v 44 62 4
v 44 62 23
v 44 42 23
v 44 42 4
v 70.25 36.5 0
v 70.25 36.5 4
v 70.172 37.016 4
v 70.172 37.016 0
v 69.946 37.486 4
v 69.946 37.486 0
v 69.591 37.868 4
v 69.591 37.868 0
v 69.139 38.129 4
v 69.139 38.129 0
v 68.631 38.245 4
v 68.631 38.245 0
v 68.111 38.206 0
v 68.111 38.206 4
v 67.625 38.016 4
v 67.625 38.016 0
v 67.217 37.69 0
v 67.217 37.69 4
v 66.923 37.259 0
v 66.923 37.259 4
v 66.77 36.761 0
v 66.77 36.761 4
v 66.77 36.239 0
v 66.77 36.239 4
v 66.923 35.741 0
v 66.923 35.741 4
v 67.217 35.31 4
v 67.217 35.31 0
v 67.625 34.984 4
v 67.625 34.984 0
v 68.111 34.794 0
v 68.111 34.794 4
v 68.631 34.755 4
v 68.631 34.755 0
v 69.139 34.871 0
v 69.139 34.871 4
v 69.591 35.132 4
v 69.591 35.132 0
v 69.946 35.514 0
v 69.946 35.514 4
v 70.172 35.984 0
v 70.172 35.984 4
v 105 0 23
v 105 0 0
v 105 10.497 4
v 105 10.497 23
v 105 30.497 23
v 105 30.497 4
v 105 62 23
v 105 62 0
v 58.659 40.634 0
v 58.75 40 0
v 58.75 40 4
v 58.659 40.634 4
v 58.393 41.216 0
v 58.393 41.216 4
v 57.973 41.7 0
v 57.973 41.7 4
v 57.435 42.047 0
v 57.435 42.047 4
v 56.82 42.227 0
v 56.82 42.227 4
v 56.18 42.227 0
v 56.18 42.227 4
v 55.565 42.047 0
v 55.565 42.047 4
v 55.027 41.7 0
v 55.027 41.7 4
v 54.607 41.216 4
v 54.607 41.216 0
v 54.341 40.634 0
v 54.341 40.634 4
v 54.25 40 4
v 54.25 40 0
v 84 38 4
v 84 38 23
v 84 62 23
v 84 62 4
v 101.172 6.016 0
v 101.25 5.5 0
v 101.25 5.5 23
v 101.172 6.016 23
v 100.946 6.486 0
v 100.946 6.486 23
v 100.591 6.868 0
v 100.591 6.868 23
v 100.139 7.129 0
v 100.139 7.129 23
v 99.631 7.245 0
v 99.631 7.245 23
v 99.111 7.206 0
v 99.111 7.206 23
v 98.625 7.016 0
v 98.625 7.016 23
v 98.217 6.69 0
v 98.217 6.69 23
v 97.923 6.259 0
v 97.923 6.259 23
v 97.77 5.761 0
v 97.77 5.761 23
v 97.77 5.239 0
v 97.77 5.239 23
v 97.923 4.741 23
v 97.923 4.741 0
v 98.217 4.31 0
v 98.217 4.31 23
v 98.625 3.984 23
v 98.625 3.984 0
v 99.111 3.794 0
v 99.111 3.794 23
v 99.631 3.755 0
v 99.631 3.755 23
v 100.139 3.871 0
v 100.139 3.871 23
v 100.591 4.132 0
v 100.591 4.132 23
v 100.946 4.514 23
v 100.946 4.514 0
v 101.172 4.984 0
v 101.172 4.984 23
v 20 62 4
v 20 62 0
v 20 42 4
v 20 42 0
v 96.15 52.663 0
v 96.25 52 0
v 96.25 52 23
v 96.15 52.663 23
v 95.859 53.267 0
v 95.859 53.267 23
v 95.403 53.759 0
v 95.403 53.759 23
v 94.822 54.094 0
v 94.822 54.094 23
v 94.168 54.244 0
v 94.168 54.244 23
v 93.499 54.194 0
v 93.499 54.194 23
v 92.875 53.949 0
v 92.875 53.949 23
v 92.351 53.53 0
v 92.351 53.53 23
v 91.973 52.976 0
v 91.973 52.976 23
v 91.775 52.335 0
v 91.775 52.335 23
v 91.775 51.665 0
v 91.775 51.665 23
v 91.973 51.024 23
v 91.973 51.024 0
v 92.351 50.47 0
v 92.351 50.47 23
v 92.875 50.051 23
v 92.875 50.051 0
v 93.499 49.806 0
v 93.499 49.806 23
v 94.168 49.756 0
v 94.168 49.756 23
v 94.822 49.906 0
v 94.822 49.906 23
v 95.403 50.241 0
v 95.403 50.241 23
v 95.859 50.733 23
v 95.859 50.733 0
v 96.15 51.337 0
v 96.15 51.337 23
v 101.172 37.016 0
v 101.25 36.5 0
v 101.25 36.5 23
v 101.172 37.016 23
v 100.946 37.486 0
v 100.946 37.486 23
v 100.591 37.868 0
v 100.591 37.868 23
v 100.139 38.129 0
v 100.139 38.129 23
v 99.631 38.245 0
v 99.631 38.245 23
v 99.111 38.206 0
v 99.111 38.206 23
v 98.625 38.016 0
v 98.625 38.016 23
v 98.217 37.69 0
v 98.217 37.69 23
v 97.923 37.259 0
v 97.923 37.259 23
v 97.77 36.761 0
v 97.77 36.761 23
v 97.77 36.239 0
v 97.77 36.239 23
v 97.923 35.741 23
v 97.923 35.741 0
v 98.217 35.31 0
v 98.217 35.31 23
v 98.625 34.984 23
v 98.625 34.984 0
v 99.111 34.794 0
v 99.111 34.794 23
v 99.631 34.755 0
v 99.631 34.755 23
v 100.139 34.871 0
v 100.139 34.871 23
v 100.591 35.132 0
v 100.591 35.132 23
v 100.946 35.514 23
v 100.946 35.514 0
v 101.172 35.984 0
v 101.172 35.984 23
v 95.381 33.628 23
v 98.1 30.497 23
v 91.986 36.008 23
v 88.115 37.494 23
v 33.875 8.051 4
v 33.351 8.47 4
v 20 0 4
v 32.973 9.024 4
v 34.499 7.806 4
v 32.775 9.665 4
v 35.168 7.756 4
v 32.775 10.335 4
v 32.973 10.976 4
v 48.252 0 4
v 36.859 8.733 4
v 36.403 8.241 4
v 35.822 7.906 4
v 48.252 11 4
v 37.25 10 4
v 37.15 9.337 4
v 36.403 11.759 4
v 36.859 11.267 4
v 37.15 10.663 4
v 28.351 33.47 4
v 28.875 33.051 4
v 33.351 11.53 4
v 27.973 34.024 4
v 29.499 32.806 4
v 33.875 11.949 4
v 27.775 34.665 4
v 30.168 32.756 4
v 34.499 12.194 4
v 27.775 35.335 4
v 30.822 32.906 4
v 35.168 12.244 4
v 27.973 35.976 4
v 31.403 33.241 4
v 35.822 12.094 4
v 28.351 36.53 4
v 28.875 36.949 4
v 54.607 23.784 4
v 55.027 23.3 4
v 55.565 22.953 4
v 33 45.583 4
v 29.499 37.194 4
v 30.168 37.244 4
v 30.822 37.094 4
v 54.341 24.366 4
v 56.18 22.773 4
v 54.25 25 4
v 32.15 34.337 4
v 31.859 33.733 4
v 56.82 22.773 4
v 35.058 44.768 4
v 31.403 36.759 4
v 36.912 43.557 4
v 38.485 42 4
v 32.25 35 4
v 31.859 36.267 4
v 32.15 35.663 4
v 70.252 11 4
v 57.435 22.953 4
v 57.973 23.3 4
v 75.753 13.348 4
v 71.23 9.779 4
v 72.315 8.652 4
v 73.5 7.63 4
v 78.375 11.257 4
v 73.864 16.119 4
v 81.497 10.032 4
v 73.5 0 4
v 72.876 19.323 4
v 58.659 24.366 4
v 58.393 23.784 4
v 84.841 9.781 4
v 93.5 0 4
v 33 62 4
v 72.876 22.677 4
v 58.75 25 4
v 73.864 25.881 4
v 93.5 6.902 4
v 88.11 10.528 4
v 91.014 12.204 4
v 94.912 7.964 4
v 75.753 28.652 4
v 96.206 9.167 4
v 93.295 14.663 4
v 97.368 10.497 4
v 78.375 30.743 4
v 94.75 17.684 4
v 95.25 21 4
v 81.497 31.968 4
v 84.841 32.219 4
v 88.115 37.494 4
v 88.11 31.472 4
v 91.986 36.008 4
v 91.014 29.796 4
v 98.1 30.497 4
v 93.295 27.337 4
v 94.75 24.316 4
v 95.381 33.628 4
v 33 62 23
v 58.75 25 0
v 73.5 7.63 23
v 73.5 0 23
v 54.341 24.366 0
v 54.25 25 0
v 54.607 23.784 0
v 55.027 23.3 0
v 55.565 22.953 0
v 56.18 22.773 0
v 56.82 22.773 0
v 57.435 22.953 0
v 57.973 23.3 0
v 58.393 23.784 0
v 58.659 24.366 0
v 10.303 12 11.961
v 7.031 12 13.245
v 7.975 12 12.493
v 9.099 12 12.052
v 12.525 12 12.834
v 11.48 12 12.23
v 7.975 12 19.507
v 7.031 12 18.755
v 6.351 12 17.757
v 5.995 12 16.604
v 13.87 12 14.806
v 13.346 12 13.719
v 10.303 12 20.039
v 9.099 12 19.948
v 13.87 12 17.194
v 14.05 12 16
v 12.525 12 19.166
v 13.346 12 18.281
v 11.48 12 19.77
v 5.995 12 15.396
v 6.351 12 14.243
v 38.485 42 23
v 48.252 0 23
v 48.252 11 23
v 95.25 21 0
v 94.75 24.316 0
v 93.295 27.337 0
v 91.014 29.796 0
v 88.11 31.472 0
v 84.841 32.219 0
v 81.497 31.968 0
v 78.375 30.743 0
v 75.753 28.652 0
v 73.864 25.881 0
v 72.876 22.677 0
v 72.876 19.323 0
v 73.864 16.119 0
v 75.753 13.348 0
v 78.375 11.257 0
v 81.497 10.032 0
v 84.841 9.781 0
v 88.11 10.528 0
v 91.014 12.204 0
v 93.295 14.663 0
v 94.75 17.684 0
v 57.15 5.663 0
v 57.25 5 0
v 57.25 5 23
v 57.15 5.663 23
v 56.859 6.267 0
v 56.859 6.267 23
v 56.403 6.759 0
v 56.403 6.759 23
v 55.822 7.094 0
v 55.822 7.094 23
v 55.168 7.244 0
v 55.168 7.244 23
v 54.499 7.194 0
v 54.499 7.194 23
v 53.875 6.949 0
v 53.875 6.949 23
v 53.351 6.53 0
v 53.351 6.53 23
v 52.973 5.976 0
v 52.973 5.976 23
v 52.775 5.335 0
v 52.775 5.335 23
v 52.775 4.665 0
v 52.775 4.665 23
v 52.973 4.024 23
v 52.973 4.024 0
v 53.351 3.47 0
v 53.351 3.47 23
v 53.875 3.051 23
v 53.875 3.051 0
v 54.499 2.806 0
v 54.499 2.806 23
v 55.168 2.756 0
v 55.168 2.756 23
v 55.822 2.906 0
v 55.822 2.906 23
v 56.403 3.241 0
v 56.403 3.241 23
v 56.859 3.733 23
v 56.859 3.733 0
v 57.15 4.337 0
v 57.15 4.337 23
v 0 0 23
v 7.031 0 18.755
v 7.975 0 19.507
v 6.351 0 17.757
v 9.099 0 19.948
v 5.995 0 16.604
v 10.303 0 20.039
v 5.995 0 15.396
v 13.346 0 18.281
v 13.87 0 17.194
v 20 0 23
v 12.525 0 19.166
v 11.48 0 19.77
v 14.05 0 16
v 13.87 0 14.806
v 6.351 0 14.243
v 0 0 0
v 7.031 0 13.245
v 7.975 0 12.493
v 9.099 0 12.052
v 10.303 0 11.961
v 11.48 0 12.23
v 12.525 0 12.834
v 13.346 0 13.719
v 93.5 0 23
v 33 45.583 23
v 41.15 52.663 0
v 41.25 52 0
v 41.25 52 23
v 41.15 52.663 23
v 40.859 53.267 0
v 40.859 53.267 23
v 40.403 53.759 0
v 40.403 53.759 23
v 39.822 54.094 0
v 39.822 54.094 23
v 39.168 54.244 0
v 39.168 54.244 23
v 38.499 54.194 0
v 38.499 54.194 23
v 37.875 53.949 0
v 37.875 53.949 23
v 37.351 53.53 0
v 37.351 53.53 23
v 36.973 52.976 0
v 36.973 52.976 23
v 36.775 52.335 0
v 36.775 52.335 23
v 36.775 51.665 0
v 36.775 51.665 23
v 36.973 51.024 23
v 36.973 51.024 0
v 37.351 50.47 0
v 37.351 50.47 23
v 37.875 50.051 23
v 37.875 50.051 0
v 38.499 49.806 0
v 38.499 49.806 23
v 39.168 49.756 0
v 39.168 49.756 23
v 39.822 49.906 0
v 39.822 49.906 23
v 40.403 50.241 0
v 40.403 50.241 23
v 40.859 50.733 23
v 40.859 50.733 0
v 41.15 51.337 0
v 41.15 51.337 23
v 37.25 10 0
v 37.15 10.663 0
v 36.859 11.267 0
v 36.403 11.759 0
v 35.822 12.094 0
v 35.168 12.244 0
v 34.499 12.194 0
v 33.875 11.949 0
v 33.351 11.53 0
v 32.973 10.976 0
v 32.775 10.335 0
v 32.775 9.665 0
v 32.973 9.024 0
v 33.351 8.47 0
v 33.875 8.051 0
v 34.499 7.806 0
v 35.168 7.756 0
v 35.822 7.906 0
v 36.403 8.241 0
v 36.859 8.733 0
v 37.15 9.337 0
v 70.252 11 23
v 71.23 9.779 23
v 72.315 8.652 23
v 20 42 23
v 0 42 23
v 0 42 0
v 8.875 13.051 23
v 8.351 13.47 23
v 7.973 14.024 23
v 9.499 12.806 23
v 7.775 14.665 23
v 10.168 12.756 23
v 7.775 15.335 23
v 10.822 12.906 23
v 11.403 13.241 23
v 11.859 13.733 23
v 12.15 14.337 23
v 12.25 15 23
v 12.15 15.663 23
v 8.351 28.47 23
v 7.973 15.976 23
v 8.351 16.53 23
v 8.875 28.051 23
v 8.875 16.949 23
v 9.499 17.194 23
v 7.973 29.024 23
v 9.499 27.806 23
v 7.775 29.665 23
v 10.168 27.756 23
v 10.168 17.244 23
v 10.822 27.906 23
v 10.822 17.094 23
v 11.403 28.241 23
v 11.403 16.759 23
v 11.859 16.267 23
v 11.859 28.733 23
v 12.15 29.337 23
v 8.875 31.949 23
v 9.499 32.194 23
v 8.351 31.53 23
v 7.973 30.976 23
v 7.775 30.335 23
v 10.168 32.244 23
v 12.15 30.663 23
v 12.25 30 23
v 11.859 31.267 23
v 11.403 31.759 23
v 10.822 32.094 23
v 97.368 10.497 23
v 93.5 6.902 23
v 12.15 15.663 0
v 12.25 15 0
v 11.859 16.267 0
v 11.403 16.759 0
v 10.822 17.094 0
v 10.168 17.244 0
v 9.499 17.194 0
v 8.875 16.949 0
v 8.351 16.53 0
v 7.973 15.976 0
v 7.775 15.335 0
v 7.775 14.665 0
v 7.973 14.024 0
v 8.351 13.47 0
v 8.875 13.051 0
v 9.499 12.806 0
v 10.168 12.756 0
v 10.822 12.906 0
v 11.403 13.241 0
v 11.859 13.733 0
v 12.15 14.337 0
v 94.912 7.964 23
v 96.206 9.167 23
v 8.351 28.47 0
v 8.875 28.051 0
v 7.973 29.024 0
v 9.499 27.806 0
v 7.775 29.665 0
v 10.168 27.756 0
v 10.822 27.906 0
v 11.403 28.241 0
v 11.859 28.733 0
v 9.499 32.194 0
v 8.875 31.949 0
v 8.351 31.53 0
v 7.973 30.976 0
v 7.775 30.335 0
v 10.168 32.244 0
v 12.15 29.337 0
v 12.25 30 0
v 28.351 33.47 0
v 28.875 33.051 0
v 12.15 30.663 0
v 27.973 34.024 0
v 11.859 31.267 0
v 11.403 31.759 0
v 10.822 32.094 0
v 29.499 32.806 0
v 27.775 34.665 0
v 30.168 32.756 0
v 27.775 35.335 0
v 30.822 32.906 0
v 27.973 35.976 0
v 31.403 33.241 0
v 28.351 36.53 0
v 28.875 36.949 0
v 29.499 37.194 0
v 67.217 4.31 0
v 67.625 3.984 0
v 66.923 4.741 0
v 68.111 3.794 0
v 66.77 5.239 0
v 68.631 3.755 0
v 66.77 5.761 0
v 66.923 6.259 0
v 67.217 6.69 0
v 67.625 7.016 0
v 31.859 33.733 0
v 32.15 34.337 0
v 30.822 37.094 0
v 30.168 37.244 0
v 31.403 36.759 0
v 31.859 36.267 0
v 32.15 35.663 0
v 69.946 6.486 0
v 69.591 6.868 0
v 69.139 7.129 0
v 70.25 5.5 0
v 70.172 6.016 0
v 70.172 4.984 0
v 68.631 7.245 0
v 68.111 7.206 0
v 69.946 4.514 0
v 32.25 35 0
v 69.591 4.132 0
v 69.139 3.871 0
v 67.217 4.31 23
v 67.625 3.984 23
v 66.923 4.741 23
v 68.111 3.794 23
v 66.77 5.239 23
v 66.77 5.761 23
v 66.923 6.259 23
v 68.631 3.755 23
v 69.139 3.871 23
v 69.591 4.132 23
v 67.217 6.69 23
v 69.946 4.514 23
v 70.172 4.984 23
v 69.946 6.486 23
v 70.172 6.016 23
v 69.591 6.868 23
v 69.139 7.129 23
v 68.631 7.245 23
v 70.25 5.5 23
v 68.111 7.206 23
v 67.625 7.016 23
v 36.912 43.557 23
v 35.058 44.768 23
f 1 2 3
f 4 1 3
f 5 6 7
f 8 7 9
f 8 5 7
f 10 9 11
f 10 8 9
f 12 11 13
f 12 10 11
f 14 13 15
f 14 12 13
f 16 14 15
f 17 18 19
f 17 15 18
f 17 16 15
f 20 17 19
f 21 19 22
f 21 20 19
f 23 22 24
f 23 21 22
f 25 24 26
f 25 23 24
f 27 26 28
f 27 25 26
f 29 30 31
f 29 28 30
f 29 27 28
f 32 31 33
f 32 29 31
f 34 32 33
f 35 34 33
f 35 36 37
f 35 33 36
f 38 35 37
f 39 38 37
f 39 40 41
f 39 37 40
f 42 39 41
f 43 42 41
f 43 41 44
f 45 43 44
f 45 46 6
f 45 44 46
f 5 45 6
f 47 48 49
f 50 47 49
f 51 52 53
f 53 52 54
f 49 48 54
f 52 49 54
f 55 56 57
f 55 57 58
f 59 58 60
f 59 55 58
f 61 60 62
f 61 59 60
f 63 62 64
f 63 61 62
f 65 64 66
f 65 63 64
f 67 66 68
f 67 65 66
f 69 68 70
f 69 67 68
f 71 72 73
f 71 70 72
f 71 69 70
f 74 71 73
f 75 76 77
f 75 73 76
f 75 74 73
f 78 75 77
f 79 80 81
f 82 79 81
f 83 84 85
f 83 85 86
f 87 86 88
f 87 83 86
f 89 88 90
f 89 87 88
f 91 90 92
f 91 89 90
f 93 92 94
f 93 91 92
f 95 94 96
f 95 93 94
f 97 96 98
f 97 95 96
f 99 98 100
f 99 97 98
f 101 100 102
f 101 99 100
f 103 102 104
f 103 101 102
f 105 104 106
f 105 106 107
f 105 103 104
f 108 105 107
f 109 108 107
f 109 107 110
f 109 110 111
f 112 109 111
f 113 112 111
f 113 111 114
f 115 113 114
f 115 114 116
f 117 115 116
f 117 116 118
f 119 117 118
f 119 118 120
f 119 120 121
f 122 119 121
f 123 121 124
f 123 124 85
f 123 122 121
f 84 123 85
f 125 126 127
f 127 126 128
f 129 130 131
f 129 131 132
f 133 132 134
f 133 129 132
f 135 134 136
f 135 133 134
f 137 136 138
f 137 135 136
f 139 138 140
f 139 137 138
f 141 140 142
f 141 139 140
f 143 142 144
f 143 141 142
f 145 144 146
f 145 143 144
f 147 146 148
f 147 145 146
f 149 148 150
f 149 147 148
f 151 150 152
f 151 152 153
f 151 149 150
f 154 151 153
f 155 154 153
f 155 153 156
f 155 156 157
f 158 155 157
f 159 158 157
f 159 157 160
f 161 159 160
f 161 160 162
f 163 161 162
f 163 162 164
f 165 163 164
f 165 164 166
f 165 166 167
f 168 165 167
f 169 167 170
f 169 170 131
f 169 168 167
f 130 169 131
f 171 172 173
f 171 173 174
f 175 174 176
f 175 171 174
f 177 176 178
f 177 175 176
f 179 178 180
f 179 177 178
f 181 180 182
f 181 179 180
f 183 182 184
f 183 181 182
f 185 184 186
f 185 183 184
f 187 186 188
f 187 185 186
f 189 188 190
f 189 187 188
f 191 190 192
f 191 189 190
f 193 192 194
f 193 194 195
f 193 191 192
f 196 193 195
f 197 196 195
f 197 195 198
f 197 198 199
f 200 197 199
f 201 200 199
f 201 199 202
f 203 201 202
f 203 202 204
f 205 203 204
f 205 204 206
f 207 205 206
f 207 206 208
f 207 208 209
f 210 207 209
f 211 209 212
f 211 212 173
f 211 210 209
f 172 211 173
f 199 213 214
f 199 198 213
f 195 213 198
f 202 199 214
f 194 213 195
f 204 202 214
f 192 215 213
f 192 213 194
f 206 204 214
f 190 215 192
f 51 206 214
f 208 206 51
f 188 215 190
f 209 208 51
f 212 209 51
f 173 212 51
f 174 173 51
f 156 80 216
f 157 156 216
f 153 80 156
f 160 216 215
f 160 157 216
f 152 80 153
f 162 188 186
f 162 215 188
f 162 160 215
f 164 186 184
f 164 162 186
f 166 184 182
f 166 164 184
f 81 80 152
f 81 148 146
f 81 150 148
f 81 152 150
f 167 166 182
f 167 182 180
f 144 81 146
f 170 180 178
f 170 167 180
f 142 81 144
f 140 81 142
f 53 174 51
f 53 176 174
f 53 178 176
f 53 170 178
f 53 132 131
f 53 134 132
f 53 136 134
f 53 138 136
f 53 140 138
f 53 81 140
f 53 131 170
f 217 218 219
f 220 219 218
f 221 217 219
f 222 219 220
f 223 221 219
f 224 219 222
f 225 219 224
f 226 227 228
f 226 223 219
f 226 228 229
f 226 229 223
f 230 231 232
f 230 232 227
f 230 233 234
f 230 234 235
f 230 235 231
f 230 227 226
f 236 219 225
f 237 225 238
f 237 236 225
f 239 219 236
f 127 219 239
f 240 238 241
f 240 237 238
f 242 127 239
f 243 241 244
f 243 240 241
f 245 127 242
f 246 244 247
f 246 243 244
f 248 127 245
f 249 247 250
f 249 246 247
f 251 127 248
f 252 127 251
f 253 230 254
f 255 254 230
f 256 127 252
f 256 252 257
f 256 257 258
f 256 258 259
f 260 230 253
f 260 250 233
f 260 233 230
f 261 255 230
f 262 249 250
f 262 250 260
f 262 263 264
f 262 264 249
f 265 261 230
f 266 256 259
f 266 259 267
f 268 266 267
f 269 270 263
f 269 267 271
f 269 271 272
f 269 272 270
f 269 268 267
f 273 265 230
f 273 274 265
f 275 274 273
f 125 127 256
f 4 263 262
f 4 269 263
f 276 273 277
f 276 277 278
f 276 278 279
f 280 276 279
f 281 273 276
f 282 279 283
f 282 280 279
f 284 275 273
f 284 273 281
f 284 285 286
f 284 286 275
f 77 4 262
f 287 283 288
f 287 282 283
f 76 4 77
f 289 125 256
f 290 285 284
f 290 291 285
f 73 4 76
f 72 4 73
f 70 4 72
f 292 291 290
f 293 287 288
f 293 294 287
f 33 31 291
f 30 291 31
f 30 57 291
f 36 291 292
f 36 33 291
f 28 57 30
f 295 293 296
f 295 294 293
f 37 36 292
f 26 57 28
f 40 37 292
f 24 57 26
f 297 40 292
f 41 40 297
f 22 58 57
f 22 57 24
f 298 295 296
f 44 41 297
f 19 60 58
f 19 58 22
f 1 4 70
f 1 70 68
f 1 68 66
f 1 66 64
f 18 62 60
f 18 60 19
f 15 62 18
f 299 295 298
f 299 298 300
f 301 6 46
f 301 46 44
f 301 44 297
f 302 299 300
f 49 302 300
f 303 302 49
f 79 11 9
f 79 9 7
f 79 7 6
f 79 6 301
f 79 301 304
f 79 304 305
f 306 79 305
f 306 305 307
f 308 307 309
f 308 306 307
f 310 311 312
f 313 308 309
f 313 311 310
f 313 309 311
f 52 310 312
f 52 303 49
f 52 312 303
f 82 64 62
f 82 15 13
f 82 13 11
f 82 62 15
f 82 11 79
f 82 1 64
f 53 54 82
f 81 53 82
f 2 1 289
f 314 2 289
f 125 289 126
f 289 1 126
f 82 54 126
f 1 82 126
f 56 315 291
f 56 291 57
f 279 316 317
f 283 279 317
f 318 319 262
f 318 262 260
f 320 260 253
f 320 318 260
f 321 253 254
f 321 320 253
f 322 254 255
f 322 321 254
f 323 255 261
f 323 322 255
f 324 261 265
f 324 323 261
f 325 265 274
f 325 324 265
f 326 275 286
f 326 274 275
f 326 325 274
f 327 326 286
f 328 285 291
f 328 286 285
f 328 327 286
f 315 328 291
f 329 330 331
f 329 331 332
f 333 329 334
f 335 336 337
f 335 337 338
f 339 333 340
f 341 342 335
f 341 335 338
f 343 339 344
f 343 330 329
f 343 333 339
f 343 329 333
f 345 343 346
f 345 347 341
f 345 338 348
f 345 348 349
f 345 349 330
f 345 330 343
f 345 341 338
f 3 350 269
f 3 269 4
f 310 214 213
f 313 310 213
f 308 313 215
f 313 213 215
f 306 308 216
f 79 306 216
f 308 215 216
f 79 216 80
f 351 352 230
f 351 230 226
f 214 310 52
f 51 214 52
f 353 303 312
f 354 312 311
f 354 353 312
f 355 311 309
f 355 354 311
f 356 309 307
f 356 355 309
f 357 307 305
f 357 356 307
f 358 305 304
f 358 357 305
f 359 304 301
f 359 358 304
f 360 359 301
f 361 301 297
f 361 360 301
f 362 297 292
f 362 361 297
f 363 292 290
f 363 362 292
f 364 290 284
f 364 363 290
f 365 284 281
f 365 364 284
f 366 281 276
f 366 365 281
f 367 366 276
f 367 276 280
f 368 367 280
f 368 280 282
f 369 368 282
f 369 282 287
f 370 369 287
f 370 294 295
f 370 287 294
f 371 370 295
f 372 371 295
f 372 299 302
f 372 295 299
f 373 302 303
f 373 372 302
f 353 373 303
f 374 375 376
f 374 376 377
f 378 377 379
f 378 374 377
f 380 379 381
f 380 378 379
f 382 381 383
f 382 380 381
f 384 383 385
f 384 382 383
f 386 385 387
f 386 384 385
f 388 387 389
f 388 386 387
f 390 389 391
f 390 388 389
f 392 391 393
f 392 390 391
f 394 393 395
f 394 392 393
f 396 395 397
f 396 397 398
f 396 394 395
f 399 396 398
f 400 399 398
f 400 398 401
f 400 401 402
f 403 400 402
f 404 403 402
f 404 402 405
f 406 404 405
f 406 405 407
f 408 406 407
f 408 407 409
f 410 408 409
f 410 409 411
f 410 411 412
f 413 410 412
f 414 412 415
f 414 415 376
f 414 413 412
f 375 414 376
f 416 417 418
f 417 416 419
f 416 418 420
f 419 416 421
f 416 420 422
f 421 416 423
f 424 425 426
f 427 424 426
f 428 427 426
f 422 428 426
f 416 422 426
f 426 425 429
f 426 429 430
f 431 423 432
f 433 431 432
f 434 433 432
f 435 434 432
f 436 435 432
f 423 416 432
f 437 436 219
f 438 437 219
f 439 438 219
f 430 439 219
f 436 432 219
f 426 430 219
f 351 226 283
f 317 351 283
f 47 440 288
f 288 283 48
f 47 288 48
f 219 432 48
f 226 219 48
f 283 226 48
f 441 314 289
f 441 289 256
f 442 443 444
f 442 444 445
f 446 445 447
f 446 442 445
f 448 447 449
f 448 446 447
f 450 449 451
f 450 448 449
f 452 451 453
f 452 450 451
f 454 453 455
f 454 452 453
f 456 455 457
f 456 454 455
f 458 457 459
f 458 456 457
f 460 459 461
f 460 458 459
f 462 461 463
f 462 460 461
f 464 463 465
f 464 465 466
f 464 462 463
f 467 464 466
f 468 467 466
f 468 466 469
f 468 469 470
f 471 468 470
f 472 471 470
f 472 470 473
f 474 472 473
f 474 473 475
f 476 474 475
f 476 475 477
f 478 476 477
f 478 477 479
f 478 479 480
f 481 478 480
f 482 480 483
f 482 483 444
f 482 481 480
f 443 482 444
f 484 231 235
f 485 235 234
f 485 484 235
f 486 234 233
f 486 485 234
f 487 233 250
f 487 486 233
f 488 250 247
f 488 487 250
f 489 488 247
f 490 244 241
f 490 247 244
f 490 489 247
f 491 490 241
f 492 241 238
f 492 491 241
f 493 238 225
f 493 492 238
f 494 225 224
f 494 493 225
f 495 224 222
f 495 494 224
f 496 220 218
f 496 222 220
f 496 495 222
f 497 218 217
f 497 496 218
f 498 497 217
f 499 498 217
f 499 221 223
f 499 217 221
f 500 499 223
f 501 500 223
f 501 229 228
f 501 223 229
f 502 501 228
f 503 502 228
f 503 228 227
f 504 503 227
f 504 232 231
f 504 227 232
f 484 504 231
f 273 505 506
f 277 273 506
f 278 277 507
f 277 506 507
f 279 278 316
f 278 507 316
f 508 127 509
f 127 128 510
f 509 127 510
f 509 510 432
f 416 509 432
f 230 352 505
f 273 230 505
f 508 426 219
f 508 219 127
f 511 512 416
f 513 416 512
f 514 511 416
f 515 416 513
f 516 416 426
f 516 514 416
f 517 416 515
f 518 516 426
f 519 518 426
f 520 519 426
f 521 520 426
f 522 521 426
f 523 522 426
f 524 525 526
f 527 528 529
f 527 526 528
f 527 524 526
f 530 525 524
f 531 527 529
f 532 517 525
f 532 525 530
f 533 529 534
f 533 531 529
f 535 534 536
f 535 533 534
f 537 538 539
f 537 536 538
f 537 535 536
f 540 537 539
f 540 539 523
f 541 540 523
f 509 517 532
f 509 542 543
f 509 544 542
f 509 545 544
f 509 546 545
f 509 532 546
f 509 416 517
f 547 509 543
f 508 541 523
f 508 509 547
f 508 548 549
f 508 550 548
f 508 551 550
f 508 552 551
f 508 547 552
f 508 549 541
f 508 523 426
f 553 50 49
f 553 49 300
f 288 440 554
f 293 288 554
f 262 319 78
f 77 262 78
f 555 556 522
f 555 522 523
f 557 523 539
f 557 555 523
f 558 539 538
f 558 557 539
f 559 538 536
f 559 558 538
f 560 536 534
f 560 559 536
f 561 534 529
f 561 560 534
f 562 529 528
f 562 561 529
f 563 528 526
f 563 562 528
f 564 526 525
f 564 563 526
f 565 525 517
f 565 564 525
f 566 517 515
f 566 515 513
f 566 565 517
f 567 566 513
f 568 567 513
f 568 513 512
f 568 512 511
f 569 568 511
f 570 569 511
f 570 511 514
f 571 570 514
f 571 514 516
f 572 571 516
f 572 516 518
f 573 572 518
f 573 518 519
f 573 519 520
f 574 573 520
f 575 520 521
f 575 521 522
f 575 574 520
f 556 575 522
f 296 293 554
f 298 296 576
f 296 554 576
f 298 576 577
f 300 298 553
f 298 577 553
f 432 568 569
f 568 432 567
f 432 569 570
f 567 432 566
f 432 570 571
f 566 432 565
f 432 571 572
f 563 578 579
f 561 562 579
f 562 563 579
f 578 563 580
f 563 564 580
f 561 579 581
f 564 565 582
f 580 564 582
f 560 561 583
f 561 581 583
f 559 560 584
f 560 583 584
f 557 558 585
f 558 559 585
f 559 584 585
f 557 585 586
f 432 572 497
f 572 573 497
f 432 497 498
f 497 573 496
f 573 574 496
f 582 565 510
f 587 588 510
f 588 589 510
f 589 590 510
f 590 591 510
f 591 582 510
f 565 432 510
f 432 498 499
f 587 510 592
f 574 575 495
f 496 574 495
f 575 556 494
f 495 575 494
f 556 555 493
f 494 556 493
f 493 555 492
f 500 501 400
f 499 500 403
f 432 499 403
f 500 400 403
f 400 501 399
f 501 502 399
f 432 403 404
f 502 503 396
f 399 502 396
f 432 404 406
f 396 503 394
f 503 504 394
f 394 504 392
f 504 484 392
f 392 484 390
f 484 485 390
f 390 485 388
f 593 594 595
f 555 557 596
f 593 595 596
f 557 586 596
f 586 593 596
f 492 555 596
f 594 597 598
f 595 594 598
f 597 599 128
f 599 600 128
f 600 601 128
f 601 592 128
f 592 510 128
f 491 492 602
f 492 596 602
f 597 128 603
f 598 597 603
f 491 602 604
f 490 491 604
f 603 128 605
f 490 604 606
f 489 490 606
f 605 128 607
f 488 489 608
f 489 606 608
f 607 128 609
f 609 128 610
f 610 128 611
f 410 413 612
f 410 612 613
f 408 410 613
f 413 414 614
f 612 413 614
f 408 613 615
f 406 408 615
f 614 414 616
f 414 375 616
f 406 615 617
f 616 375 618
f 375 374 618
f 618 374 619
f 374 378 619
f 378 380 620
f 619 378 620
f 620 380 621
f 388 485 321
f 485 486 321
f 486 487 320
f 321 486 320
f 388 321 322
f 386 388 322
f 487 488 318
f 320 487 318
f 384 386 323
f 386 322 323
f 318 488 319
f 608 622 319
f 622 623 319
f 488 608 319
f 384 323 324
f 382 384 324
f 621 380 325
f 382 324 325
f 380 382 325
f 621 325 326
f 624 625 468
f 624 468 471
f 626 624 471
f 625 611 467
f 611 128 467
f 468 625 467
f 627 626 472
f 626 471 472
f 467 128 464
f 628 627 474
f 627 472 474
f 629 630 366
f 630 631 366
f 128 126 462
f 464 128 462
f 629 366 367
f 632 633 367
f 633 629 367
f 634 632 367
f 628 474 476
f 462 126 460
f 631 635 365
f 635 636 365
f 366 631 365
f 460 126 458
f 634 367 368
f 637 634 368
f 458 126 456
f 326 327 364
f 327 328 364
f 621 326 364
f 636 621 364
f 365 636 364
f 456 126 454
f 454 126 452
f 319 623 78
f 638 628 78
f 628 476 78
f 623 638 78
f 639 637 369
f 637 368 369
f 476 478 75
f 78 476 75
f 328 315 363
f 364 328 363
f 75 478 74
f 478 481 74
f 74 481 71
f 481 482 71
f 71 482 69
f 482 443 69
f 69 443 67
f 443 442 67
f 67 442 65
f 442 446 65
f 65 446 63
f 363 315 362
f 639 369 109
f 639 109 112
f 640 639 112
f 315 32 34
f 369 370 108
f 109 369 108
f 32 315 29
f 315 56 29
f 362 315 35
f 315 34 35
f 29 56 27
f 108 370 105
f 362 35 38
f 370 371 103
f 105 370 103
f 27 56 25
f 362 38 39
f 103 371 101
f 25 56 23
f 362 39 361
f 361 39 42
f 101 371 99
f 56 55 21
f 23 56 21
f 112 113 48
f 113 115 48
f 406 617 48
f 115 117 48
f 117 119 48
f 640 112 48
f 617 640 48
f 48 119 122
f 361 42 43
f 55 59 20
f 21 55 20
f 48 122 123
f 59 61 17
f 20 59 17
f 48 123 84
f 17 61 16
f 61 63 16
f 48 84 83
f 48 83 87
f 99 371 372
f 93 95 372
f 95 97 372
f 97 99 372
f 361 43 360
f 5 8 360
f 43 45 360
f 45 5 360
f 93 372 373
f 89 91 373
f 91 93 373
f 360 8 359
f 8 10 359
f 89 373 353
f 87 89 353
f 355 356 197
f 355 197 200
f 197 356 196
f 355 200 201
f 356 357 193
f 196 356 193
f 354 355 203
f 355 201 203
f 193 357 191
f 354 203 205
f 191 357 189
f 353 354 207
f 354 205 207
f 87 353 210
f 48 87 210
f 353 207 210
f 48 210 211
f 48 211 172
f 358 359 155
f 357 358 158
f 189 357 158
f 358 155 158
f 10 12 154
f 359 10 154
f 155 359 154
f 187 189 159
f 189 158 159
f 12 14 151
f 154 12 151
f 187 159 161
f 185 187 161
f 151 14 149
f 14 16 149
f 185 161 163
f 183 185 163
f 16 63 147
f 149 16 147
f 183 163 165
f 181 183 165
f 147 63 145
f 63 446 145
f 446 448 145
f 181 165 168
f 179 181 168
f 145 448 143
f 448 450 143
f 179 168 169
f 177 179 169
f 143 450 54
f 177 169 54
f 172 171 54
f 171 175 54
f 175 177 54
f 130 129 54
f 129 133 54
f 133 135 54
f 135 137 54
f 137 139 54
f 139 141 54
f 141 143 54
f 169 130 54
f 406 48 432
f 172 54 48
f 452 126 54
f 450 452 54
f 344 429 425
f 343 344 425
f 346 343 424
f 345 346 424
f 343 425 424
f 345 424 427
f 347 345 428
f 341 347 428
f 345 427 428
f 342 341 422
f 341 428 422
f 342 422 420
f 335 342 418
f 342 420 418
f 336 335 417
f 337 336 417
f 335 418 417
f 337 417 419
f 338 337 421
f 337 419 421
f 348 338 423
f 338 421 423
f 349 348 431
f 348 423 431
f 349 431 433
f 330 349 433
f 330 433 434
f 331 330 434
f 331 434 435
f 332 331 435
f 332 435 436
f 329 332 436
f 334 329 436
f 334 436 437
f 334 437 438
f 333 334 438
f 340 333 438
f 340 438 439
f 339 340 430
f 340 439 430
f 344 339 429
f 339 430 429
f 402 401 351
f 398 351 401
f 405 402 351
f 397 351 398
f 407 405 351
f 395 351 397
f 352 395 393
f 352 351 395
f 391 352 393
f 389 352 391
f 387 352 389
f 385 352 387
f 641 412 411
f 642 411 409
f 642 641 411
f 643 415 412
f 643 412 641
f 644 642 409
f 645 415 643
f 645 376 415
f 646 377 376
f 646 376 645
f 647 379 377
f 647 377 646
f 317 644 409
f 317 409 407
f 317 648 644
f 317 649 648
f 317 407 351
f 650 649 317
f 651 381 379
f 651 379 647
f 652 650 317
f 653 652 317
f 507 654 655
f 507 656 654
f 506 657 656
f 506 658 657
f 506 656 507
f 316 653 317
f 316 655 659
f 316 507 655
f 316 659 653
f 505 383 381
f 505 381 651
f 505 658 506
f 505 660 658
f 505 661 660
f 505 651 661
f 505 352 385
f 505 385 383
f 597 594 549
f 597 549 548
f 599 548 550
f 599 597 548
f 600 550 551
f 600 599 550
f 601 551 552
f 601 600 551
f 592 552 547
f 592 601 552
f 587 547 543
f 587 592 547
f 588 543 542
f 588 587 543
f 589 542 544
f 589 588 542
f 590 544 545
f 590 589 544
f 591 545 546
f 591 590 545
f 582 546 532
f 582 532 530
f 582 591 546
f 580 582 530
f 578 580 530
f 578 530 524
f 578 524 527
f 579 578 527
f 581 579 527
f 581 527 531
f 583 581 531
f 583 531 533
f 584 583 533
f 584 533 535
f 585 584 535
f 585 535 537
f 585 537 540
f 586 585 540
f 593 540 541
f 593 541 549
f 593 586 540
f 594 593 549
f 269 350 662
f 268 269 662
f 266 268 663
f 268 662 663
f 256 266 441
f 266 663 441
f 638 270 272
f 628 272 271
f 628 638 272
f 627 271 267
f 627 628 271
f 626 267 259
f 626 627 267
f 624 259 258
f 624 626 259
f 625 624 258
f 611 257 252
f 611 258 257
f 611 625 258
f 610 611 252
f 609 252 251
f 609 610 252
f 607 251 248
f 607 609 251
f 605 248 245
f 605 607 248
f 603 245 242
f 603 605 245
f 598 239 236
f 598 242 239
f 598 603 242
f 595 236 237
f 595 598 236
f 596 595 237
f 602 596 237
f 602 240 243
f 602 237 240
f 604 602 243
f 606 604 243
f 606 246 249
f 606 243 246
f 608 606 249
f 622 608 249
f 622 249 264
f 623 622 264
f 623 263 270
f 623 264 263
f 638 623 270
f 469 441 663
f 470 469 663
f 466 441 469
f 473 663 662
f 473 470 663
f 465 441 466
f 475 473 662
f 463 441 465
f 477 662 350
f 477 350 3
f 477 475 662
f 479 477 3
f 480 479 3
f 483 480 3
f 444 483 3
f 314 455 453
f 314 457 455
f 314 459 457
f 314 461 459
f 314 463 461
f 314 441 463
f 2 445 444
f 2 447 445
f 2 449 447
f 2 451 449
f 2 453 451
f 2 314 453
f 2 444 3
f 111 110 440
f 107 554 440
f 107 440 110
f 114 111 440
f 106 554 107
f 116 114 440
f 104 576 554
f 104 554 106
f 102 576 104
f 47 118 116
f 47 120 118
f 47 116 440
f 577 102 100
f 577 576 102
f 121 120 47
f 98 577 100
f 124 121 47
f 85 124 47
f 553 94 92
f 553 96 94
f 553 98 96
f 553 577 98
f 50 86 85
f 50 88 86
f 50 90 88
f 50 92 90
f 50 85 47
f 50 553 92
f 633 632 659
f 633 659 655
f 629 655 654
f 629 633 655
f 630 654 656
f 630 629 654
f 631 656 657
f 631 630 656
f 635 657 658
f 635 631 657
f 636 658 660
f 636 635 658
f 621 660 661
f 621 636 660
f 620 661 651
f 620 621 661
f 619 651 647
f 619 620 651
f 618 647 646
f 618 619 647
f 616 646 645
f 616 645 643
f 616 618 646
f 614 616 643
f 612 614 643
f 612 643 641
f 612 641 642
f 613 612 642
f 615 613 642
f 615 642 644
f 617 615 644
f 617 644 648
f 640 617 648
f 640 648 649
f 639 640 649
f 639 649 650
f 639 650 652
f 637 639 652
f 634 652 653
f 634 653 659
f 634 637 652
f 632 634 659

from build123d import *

# Parameters (mm, degrees)
SKETCH_R        = 2.25
SKETCH_R_2      = 11.25
SKETCH_R_3      = 1.75
PAD_DEPTH       = 23
POCKET_DEPTH    = 19
SKETCH003_R     = 4.05
POCKET002_DEPTH = 12


with BuildPart() as part:
    # Sketch → Pad (new body)
    with BuildSketch(Plane.XY):
        Polygon((0, 0), (105, 0), (105, 62), (20, 62), (20, 42), (0, 42), align=None)
        with Locations((35, 10)):
            Circle(SKETCH_R, mode=Mode.SUBTRACT)
        with Locations((30, 35)):
            Circle(SKETCH_R, mode=Mode.SUBTRACT)
        with Locations((84, 21)):
            Circle(SKETCH_R_2, mode=Mode.SUBTRACT)
        with Locations((68.5, 36.5)):
            Circle(SKETCH_R_3, mode=Mode.SUBTRACT)
        with Locations((99.5, 36.5)):
            Circle(SKETCH_R_3, mode=Mode.SUBTRACT)
        with Locations((68.5, 5.5)):
            Circle(SKETCH_R_3, mode=Mode.SUBTRACT)
        with Locations((99.5, 5.5)):
            Circle(SKETCH_R_3, mode=Mode.SUBTRACT)
        with Locations((10, 30)):
            Circle(SKETCH_R, mode=Mode.SUBTRACT)
        with Locations((10, 15)):
            Circle(SKETCH_R, mode=Mode.SUBTRACT)
        with Locations((39, 52)):
            Circle(SKETCH_R, mode=Mode.SUBTRACT)
        with Locations((94, 52)):
            Circle(SKETCH_R, mode=Mode.SUBTRACT)
        with Locations((55, 5)):
            Circle(SKETCH_R, mode=Mode.SUBTRACT)
        with BuildLine():
            Line((58.75, 25), (58.75, 40))
            ThreePointArc((58.75, 40), (56.5, 42.25), (54.25, 40))
            Line((54.25, 25), (54.25, 40))
            ThreePointArc((54.25, 25), (56.5, 22.75), (58.75, 25))
        make_face(mode=Mode.SUBTRACT)
    extrude(amount=PAD_DEPTH)

    # Sketch001 → Pocket (cut)
    with BuildSketch(Plane.XY.offset(23)):
        with BuildLine():
            ThreePointArc((38.485281, 42), (36.015595, 44.209377), (32.999996, 45.583006))
            Line((32.999996, 67), (32.999996, 45.583006))
            Line((20, 67), (32.999996, 67))
            Line((20, -1), (20, 67))
            Line((20, -1), (48.252269, -1))
            Line((48.252269, 11), (48.252269, -1))
            Line((48.252269, 11), (70.252269, 11))
            ThreePointArc((70.252269, 11), (71.759618, 9.202833), (73.499996, 7.630258))
            Line((73.499996, 7.630258), (73.499996, -1))
            Line((73.499996, -1), (93.499996, -1))
            Line((93.499996, -1), (93.499996, 6.902128))
            ThreePointArc((93.499996, 6.902128), (95.574295, 8.548671), (97.367695, 10.497399))
            Line((105.499996, 10.497399), (97.367695, 10.497399))
            Line((105.499996, 30.497399), (105.499996, 10.497399))
            Line((98.099621, 30.497399), (105.499996, 30.497399))
            ThreePointArc((98.099621, 30.497399), (91.98574, 36.007594), (83.999996, 38))
            Line((83.999996, 38), (83.999996, 67))
            Line((83.999996, 67), (43.999996, 67))
            Line((43.999996, 67), (43.999996, 42))
            Line((38.485281, 42), (43.999996, 42))
        make_face()
    extrude(amount=-POCKET_DEPTH, mode=Mode.SUBTRACT)

    # Sketch003 → Pocket002 (cut)
    with BuildSketch(Plane.XZ):
        with Locations((10, 16)):
            Circle(SKETCH003_R)
    extrude(amount=-POCKET002_DEPTH, mode=Mode.SUBTRACT)


solid = part.part
